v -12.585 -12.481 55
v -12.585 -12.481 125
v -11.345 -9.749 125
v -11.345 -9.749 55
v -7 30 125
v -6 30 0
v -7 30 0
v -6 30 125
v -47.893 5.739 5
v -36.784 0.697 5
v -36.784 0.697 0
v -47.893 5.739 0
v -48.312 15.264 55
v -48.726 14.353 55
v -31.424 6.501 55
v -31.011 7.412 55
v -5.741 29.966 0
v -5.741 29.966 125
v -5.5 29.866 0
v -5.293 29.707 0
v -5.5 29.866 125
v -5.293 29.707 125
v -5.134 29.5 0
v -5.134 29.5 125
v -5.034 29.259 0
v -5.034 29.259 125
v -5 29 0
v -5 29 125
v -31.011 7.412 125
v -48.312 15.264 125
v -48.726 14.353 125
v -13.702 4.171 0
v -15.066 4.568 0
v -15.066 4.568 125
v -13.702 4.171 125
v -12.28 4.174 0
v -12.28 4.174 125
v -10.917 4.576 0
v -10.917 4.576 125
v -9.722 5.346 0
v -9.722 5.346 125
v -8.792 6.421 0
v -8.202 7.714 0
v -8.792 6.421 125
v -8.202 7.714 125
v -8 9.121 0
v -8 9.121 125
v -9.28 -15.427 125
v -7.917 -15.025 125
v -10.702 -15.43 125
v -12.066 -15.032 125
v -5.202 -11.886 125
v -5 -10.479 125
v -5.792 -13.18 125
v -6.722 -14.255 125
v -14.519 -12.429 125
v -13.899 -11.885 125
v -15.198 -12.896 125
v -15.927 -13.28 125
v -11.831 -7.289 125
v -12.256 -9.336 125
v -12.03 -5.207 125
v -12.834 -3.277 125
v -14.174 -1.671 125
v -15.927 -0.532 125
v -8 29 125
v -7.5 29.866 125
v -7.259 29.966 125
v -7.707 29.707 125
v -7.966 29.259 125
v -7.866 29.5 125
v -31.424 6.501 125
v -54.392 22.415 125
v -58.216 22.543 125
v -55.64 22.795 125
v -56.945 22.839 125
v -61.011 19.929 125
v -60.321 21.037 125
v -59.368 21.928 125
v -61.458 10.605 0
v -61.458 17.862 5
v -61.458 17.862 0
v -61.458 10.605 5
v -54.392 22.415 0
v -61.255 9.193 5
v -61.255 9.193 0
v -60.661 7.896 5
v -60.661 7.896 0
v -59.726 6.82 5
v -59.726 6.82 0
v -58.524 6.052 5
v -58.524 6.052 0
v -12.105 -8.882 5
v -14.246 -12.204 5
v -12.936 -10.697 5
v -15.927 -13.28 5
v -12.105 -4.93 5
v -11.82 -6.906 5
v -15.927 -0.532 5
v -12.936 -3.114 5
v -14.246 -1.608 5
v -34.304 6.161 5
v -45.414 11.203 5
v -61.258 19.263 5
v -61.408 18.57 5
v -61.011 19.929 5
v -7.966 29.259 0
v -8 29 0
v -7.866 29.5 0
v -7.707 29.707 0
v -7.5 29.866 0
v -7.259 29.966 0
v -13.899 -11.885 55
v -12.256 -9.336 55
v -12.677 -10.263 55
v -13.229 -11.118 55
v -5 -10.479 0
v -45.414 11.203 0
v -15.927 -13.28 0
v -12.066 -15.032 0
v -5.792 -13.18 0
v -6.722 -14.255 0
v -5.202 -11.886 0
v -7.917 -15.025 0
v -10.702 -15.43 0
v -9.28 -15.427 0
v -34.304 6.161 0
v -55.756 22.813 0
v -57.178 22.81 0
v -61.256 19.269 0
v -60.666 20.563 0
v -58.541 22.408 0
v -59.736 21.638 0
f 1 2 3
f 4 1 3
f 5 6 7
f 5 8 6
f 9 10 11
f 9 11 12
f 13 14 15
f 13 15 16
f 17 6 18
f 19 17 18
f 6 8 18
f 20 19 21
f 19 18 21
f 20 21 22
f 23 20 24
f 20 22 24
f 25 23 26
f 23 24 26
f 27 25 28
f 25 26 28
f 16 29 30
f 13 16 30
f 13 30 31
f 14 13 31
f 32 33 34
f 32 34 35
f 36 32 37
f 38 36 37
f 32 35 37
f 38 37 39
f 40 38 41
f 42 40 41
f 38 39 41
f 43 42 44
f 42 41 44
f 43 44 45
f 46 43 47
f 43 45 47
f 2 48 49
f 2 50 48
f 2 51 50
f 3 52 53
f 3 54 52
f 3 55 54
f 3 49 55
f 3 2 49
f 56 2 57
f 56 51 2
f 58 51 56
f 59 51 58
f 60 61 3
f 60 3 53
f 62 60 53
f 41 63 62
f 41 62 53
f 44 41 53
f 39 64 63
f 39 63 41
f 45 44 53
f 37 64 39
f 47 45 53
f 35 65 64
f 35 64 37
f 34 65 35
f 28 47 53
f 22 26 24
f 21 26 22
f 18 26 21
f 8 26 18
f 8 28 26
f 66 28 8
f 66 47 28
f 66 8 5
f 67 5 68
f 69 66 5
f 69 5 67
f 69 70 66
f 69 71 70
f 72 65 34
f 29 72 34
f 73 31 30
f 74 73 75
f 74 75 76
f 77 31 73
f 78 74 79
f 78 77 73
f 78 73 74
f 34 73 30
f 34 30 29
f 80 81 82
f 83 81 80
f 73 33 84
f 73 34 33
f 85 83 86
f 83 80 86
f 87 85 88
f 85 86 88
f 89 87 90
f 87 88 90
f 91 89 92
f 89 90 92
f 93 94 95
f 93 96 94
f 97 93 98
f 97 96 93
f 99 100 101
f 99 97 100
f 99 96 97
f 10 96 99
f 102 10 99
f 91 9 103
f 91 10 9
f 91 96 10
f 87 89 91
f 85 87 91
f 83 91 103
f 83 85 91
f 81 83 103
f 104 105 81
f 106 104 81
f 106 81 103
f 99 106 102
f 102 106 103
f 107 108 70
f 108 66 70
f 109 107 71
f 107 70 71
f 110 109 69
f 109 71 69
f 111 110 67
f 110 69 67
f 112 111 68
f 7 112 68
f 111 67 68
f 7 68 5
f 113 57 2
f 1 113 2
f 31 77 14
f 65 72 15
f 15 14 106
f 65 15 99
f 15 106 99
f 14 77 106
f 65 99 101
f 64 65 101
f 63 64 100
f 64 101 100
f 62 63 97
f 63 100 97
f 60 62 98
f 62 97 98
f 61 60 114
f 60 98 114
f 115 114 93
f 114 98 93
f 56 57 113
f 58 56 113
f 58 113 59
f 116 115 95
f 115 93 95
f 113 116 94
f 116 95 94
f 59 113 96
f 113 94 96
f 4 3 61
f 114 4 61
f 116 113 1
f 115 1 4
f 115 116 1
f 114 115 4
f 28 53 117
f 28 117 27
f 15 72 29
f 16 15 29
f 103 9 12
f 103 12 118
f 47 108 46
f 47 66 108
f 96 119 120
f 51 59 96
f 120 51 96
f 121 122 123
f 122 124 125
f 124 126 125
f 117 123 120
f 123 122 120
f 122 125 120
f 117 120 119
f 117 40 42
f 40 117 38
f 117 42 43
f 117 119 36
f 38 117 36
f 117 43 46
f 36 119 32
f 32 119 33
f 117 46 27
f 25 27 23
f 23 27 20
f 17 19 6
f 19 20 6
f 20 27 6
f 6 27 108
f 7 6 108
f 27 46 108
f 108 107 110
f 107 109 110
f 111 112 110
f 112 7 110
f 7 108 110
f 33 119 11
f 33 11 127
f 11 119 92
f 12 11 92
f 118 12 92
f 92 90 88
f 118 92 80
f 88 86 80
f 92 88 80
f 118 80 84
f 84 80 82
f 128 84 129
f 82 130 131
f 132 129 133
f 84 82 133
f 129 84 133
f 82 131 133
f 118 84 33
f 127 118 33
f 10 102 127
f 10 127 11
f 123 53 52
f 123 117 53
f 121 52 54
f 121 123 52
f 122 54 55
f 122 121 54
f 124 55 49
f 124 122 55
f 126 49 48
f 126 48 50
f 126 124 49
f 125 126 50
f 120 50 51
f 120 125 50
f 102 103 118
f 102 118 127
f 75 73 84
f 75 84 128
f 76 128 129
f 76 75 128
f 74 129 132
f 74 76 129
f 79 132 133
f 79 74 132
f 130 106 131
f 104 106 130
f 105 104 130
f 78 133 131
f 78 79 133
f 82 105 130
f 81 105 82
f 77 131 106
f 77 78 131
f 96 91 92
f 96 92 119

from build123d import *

# Parameters (mm, degrees)
F1_DEPTH = 120
F3_DEPTH = 5
F4_DEPTH = 5
F6_DEPTH = 70
F7_R     = 5
F8_R     = 1
F9_ANGLE = 90


with BuildPart() as f1:
    # F0 (on Right) → F1 (new body)
    with BuildSketch(Plane.YZ):
        with BuildLine():
            Line((-18.2393755255, 0), (0, 0))
            Line((0, 0), (1.3614935385, 3))
            Line((1.3614935385, 3), (25.6223567947, 56.4579031871))
            Line((25.6223567947, 56.4579031871), (20.1315400534, 56.4579031871))
            Line((20.1315400534, 56.4579031871), (-0.5316509101, 10.9273361007))
            ThreePointArc((-0.5316509101, 10.9273361007), (-6.9059303022, 6.8201828356), (-13.2802096943, 10.9273361007))
            Line((-13.2802096943, 10.9273361007), (-18.2393755255, 0))
        make_face()
        Polygon((1.3614935385, 3), (0, 0), (30, 0), (30, 3), align=None)
    extrude(amount=F1_DEPTH)

    # F0 (on Right) + F2 (on Right) → F3 (join)
    with BuildSketch(Plane.YZ):
        with BuildLine():
            Line((-18.2393755255, 0), (0, 0))
            Line((0, 0), (1.3614935385, 3))
            Line((1.3614935385, 3), (25.6223567947, 56.4579031871))
            Line((25.6223567947, 56.4579031871), (20.1315400534, 56.4579031871))
            Line((20.1315400534, 56.4579031871), (-0.5316509101, 10.9273361007))
            ThreePointArc((-0.5316509101, 10.9273361007), (-6.9059303022, 6.8201828356), (-13.2802096943, 10.9273361007))
            Line((-13.2802096943, 10.9273361007), (-18.2393755255, 0))
        make_face()
    with BuildSketch(Plane.YZ):
        Polygon((0, 0), (25.6223567947, 56.4579031871), (7.3829812692, 56.4579031871), (-13.2802096943, 10.9273361007), (-18.2393755255, 0), align=None)
        Polygon((11.2028951482, 40.4136113624), (6.1610765531, 29.3041529933), (0.6974085027, 31.7837359089), (5.7392270978, 42.893194278), align=None, mode=Mode.SUBTRACT)
    extrude(amount=-F3_DEPTH)

    # F0 (on Right) → F4 (join, through all)
    with BuildSketch(Plane.YZ):
        Polygon((1.3614935385, 3), (0, 0), (30, 0), (30, 3), align=None)
    extrude(amount=-F4_DEPTH)

    # F5 (on face) → F6 (cut)
    with BuildSketch(Plane.YZ.offset(120)):
        with BuildLine():
            ThreePointArc((-9.3360822182, 7.2555532448), (-10.7003955127, 7.9378334949), (-11.8845214943, 8.8994481606))
            Line((-11.8845214943, 8.8994481606), (-12.4811800626, 7.5847333608))
            Line((-12.4811800626, 7.5847333608), (-9.7493460374, 6.344941903))
            Line((-9.7493460374, 6.344941903), (-9.3360822182, 7.2555532448))
        make_face()
        Polygon((14.3532357317, 43.7256261138), (6.5012231655, 26.424010621), (7.4118345073, 26.0107468017), (15.2638470734, 43.3123622945), align=None)
    extrude(amount=-F6_DEPTH, mode=Mode.SUBTRACT)

    # F7 (call 1 of 4: OpenCascade refuses the feature's edges together)
    f7_edges = [f1.edges().sort_by_distance(p)[0] for p in [
        (57.5, -18.239376, 0),
    ]]
    fillet(f7_edges, radius=F7_R)

    # F7#2 (call 2 of 4)
    f7_2_edges = [f1.edges().sort_by_distance(p)[0] for p in [
        (-2.5, 7.382981, 56.457903),
    ]]
    fillet(f7_2_edges, radius=F7_R)

    # F7#4 (call 3 of 4)
    f7_4_edges = [f1.edges().sort_by_distance(p)[0] for p in [
        (57.5, 1.361494, 3),
    ]]
    fillet(f7_4_edges, radius=F7_R)

    # F7#3 (call 4 of 4)
    f7_3_edges = [f1.edges().sort_by_distance(p)[0] for p in [
        (57.5, 25.622357, 56.457903),
    ]]
    fillet(f7_3_edges, radius=F7_R)

    # F8
    f8_edges = [f1.edges().sort_by_distance(p)[0] for p in [
        (57.5, 30, 3),
        (57.5, 30, 0),
    ]]
    fillet(f8_edges, radius=F8_R)


with BuildPart() as f1_1:
    # F9: moved
    add(f1.part.rotate(Axis((-5, 9.2602985566, 0), (0, -1, 0)), F9_ANGLE))


solid = f1_1.part
